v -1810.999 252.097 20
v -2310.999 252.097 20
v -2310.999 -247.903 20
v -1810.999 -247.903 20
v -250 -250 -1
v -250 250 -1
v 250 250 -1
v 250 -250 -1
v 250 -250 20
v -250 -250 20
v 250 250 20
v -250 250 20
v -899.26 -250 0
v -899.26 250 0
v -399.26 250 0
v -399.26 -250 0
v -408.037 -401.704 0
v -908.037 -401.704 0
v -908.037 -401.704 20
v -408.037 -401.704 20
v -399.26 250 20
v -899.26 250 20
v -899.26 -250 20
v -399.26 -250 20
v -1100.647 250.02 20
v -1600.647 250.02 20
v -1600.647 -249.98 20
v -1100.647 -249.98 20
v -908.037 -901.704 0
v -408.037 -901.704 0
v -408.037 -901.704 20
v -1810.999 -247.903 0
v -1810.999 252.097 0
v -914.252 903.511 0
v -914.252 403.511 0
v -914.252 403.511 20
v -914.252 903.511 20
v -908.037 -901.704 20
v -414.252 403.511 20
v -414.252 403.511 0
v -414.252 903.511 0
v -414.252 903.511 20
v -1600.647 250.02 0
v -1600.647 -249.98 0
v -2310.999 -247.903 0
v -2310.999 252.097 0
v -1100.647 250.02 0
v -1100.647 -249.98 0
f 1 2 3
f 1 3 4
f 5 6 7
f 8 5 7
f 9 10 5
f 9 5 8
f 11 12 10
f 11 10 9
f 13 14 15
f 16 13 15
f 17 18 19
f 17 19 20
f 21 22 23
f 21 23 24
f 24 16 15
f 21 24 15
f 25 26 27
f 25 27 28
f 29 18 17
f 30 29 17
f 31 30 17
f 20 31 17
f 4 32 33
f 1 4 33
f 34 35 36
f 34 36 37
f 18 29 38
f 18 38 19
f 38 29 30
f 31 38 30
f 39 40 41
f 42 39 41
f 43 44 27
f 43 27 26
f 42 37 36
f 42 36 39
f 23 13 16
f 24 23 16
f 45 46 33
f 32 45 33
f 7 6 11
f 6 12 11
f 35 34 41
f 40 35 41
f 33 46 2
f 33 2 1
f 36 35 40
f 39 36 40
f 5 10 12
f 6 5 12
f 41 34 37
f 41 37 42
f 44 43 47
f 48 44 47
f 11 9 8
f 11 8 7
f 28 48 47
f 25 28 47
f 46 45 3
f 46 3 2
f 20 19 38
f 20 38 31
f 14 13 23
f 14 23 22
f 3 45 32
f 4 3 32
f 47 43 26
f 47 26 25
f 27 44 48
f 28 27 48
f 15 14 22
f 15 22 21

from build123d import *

# Parameters (mm, degrees)
CROQUIS2_W                   = 500
CROQUIS2_H                   = 500
SALIENTE_EXTRUIR1_DEPTH      = 20
SALIENTE_EXTRUIR1_DEPTH_BACK = 1
CROQUIS3_W                   = 500
CROQUIS3_H                   = 500
SALIENTE_EXTRUIR4_DEPTH      = 20
CROQUIS6_W                   = 500
CROQUIS6_H                   = 500
SALIENTE_EXTRUIR8_DEPTH      = 20
SALIENTE_EXTRUIR8_2_DEPTH    = 20
SALIENTE_EXTRUIR8_3_DEPTH    = 20
SALIENTE_EXTRUIR8_4_DEPTH    = 20


with BuildPart() as part:
    # Croquis2 → Saliente-Extruir1 (new body, two sides)
    with BuildSketch(Plane.XY) as saliente_extruir1_sk:
        Rectangle(CROQUIS2_W, CROQUIS2_H)
    extrude(amount=SALIENTE_EXTRUIR1_DEPTH)
    extrude(saliente_extruir1_sk.sketch, amount=-SALIENTE_EXTRUIR1_DEPTH_BACK)


with BuildPart() as body_2:
    # Croquis3 → Saliente-Extruir4 (new body)
    with BuildSketch(Plane.XY):
        with Locations((-649.260038847, 0)):
            Rectangle(CROQUIS3_W, CROQUIS3_H)
    extrude(amount=SALIENTE_EXTRUIR4_DEPTH)


with BuildPart() as body_3:
    # Croquis6 → Saliente-Extruir8 (new body)
    with BuildSketch(Plane.XY):
        with Locations((-2060.998610557, 2.097428348)):
            Rectangle(CROQUIS6_W, CROQUIS6_H)
    extrude(amount=SALIENTE_EXTRUIR8_DEPTH)


with BuildPart() as body_4:
    # Croquis6 → Saliente-Extruir8 2 (new body)
    with BuildSketch(Plane.XY):
        with Locations((-1350.647175862, 0.020163499)):
            Rectangle(CROQUIS6_W, CROQUIS6_H)
    extrude(amount=SALIENTE_EXTRUIR8_2_DEPTH)


with BuildPart() as body_5:
    # Croquis6 → Saliente-Extruir8 3 (new body)
    with BuildSketch(Plane.XY):
        with Locations((-664.251974106, 653.510640464)):
            Rectangle(CROQUIS6_W, CROQUIS6_H)
    extrude(amount=SALIENTE_EXTRUIR8_3_DEPTH)


with BuildPart() as body_6:
    # Croquis6 → Saliente-Extruir8 4 (new body)
    with BuildSketch(Plane.XY):
        with Locations((-658.036665945, -651.704073477)):
            Rectangle(CROQUIS6_W, CROQUIS6_H)
    extrude(amount=SALIENTE_EXTRUIR8_4_DEPTH)


solid = Compound([part.part, body_2.part, body_3.part, body_4.part, body_5.part, body_6.part])
